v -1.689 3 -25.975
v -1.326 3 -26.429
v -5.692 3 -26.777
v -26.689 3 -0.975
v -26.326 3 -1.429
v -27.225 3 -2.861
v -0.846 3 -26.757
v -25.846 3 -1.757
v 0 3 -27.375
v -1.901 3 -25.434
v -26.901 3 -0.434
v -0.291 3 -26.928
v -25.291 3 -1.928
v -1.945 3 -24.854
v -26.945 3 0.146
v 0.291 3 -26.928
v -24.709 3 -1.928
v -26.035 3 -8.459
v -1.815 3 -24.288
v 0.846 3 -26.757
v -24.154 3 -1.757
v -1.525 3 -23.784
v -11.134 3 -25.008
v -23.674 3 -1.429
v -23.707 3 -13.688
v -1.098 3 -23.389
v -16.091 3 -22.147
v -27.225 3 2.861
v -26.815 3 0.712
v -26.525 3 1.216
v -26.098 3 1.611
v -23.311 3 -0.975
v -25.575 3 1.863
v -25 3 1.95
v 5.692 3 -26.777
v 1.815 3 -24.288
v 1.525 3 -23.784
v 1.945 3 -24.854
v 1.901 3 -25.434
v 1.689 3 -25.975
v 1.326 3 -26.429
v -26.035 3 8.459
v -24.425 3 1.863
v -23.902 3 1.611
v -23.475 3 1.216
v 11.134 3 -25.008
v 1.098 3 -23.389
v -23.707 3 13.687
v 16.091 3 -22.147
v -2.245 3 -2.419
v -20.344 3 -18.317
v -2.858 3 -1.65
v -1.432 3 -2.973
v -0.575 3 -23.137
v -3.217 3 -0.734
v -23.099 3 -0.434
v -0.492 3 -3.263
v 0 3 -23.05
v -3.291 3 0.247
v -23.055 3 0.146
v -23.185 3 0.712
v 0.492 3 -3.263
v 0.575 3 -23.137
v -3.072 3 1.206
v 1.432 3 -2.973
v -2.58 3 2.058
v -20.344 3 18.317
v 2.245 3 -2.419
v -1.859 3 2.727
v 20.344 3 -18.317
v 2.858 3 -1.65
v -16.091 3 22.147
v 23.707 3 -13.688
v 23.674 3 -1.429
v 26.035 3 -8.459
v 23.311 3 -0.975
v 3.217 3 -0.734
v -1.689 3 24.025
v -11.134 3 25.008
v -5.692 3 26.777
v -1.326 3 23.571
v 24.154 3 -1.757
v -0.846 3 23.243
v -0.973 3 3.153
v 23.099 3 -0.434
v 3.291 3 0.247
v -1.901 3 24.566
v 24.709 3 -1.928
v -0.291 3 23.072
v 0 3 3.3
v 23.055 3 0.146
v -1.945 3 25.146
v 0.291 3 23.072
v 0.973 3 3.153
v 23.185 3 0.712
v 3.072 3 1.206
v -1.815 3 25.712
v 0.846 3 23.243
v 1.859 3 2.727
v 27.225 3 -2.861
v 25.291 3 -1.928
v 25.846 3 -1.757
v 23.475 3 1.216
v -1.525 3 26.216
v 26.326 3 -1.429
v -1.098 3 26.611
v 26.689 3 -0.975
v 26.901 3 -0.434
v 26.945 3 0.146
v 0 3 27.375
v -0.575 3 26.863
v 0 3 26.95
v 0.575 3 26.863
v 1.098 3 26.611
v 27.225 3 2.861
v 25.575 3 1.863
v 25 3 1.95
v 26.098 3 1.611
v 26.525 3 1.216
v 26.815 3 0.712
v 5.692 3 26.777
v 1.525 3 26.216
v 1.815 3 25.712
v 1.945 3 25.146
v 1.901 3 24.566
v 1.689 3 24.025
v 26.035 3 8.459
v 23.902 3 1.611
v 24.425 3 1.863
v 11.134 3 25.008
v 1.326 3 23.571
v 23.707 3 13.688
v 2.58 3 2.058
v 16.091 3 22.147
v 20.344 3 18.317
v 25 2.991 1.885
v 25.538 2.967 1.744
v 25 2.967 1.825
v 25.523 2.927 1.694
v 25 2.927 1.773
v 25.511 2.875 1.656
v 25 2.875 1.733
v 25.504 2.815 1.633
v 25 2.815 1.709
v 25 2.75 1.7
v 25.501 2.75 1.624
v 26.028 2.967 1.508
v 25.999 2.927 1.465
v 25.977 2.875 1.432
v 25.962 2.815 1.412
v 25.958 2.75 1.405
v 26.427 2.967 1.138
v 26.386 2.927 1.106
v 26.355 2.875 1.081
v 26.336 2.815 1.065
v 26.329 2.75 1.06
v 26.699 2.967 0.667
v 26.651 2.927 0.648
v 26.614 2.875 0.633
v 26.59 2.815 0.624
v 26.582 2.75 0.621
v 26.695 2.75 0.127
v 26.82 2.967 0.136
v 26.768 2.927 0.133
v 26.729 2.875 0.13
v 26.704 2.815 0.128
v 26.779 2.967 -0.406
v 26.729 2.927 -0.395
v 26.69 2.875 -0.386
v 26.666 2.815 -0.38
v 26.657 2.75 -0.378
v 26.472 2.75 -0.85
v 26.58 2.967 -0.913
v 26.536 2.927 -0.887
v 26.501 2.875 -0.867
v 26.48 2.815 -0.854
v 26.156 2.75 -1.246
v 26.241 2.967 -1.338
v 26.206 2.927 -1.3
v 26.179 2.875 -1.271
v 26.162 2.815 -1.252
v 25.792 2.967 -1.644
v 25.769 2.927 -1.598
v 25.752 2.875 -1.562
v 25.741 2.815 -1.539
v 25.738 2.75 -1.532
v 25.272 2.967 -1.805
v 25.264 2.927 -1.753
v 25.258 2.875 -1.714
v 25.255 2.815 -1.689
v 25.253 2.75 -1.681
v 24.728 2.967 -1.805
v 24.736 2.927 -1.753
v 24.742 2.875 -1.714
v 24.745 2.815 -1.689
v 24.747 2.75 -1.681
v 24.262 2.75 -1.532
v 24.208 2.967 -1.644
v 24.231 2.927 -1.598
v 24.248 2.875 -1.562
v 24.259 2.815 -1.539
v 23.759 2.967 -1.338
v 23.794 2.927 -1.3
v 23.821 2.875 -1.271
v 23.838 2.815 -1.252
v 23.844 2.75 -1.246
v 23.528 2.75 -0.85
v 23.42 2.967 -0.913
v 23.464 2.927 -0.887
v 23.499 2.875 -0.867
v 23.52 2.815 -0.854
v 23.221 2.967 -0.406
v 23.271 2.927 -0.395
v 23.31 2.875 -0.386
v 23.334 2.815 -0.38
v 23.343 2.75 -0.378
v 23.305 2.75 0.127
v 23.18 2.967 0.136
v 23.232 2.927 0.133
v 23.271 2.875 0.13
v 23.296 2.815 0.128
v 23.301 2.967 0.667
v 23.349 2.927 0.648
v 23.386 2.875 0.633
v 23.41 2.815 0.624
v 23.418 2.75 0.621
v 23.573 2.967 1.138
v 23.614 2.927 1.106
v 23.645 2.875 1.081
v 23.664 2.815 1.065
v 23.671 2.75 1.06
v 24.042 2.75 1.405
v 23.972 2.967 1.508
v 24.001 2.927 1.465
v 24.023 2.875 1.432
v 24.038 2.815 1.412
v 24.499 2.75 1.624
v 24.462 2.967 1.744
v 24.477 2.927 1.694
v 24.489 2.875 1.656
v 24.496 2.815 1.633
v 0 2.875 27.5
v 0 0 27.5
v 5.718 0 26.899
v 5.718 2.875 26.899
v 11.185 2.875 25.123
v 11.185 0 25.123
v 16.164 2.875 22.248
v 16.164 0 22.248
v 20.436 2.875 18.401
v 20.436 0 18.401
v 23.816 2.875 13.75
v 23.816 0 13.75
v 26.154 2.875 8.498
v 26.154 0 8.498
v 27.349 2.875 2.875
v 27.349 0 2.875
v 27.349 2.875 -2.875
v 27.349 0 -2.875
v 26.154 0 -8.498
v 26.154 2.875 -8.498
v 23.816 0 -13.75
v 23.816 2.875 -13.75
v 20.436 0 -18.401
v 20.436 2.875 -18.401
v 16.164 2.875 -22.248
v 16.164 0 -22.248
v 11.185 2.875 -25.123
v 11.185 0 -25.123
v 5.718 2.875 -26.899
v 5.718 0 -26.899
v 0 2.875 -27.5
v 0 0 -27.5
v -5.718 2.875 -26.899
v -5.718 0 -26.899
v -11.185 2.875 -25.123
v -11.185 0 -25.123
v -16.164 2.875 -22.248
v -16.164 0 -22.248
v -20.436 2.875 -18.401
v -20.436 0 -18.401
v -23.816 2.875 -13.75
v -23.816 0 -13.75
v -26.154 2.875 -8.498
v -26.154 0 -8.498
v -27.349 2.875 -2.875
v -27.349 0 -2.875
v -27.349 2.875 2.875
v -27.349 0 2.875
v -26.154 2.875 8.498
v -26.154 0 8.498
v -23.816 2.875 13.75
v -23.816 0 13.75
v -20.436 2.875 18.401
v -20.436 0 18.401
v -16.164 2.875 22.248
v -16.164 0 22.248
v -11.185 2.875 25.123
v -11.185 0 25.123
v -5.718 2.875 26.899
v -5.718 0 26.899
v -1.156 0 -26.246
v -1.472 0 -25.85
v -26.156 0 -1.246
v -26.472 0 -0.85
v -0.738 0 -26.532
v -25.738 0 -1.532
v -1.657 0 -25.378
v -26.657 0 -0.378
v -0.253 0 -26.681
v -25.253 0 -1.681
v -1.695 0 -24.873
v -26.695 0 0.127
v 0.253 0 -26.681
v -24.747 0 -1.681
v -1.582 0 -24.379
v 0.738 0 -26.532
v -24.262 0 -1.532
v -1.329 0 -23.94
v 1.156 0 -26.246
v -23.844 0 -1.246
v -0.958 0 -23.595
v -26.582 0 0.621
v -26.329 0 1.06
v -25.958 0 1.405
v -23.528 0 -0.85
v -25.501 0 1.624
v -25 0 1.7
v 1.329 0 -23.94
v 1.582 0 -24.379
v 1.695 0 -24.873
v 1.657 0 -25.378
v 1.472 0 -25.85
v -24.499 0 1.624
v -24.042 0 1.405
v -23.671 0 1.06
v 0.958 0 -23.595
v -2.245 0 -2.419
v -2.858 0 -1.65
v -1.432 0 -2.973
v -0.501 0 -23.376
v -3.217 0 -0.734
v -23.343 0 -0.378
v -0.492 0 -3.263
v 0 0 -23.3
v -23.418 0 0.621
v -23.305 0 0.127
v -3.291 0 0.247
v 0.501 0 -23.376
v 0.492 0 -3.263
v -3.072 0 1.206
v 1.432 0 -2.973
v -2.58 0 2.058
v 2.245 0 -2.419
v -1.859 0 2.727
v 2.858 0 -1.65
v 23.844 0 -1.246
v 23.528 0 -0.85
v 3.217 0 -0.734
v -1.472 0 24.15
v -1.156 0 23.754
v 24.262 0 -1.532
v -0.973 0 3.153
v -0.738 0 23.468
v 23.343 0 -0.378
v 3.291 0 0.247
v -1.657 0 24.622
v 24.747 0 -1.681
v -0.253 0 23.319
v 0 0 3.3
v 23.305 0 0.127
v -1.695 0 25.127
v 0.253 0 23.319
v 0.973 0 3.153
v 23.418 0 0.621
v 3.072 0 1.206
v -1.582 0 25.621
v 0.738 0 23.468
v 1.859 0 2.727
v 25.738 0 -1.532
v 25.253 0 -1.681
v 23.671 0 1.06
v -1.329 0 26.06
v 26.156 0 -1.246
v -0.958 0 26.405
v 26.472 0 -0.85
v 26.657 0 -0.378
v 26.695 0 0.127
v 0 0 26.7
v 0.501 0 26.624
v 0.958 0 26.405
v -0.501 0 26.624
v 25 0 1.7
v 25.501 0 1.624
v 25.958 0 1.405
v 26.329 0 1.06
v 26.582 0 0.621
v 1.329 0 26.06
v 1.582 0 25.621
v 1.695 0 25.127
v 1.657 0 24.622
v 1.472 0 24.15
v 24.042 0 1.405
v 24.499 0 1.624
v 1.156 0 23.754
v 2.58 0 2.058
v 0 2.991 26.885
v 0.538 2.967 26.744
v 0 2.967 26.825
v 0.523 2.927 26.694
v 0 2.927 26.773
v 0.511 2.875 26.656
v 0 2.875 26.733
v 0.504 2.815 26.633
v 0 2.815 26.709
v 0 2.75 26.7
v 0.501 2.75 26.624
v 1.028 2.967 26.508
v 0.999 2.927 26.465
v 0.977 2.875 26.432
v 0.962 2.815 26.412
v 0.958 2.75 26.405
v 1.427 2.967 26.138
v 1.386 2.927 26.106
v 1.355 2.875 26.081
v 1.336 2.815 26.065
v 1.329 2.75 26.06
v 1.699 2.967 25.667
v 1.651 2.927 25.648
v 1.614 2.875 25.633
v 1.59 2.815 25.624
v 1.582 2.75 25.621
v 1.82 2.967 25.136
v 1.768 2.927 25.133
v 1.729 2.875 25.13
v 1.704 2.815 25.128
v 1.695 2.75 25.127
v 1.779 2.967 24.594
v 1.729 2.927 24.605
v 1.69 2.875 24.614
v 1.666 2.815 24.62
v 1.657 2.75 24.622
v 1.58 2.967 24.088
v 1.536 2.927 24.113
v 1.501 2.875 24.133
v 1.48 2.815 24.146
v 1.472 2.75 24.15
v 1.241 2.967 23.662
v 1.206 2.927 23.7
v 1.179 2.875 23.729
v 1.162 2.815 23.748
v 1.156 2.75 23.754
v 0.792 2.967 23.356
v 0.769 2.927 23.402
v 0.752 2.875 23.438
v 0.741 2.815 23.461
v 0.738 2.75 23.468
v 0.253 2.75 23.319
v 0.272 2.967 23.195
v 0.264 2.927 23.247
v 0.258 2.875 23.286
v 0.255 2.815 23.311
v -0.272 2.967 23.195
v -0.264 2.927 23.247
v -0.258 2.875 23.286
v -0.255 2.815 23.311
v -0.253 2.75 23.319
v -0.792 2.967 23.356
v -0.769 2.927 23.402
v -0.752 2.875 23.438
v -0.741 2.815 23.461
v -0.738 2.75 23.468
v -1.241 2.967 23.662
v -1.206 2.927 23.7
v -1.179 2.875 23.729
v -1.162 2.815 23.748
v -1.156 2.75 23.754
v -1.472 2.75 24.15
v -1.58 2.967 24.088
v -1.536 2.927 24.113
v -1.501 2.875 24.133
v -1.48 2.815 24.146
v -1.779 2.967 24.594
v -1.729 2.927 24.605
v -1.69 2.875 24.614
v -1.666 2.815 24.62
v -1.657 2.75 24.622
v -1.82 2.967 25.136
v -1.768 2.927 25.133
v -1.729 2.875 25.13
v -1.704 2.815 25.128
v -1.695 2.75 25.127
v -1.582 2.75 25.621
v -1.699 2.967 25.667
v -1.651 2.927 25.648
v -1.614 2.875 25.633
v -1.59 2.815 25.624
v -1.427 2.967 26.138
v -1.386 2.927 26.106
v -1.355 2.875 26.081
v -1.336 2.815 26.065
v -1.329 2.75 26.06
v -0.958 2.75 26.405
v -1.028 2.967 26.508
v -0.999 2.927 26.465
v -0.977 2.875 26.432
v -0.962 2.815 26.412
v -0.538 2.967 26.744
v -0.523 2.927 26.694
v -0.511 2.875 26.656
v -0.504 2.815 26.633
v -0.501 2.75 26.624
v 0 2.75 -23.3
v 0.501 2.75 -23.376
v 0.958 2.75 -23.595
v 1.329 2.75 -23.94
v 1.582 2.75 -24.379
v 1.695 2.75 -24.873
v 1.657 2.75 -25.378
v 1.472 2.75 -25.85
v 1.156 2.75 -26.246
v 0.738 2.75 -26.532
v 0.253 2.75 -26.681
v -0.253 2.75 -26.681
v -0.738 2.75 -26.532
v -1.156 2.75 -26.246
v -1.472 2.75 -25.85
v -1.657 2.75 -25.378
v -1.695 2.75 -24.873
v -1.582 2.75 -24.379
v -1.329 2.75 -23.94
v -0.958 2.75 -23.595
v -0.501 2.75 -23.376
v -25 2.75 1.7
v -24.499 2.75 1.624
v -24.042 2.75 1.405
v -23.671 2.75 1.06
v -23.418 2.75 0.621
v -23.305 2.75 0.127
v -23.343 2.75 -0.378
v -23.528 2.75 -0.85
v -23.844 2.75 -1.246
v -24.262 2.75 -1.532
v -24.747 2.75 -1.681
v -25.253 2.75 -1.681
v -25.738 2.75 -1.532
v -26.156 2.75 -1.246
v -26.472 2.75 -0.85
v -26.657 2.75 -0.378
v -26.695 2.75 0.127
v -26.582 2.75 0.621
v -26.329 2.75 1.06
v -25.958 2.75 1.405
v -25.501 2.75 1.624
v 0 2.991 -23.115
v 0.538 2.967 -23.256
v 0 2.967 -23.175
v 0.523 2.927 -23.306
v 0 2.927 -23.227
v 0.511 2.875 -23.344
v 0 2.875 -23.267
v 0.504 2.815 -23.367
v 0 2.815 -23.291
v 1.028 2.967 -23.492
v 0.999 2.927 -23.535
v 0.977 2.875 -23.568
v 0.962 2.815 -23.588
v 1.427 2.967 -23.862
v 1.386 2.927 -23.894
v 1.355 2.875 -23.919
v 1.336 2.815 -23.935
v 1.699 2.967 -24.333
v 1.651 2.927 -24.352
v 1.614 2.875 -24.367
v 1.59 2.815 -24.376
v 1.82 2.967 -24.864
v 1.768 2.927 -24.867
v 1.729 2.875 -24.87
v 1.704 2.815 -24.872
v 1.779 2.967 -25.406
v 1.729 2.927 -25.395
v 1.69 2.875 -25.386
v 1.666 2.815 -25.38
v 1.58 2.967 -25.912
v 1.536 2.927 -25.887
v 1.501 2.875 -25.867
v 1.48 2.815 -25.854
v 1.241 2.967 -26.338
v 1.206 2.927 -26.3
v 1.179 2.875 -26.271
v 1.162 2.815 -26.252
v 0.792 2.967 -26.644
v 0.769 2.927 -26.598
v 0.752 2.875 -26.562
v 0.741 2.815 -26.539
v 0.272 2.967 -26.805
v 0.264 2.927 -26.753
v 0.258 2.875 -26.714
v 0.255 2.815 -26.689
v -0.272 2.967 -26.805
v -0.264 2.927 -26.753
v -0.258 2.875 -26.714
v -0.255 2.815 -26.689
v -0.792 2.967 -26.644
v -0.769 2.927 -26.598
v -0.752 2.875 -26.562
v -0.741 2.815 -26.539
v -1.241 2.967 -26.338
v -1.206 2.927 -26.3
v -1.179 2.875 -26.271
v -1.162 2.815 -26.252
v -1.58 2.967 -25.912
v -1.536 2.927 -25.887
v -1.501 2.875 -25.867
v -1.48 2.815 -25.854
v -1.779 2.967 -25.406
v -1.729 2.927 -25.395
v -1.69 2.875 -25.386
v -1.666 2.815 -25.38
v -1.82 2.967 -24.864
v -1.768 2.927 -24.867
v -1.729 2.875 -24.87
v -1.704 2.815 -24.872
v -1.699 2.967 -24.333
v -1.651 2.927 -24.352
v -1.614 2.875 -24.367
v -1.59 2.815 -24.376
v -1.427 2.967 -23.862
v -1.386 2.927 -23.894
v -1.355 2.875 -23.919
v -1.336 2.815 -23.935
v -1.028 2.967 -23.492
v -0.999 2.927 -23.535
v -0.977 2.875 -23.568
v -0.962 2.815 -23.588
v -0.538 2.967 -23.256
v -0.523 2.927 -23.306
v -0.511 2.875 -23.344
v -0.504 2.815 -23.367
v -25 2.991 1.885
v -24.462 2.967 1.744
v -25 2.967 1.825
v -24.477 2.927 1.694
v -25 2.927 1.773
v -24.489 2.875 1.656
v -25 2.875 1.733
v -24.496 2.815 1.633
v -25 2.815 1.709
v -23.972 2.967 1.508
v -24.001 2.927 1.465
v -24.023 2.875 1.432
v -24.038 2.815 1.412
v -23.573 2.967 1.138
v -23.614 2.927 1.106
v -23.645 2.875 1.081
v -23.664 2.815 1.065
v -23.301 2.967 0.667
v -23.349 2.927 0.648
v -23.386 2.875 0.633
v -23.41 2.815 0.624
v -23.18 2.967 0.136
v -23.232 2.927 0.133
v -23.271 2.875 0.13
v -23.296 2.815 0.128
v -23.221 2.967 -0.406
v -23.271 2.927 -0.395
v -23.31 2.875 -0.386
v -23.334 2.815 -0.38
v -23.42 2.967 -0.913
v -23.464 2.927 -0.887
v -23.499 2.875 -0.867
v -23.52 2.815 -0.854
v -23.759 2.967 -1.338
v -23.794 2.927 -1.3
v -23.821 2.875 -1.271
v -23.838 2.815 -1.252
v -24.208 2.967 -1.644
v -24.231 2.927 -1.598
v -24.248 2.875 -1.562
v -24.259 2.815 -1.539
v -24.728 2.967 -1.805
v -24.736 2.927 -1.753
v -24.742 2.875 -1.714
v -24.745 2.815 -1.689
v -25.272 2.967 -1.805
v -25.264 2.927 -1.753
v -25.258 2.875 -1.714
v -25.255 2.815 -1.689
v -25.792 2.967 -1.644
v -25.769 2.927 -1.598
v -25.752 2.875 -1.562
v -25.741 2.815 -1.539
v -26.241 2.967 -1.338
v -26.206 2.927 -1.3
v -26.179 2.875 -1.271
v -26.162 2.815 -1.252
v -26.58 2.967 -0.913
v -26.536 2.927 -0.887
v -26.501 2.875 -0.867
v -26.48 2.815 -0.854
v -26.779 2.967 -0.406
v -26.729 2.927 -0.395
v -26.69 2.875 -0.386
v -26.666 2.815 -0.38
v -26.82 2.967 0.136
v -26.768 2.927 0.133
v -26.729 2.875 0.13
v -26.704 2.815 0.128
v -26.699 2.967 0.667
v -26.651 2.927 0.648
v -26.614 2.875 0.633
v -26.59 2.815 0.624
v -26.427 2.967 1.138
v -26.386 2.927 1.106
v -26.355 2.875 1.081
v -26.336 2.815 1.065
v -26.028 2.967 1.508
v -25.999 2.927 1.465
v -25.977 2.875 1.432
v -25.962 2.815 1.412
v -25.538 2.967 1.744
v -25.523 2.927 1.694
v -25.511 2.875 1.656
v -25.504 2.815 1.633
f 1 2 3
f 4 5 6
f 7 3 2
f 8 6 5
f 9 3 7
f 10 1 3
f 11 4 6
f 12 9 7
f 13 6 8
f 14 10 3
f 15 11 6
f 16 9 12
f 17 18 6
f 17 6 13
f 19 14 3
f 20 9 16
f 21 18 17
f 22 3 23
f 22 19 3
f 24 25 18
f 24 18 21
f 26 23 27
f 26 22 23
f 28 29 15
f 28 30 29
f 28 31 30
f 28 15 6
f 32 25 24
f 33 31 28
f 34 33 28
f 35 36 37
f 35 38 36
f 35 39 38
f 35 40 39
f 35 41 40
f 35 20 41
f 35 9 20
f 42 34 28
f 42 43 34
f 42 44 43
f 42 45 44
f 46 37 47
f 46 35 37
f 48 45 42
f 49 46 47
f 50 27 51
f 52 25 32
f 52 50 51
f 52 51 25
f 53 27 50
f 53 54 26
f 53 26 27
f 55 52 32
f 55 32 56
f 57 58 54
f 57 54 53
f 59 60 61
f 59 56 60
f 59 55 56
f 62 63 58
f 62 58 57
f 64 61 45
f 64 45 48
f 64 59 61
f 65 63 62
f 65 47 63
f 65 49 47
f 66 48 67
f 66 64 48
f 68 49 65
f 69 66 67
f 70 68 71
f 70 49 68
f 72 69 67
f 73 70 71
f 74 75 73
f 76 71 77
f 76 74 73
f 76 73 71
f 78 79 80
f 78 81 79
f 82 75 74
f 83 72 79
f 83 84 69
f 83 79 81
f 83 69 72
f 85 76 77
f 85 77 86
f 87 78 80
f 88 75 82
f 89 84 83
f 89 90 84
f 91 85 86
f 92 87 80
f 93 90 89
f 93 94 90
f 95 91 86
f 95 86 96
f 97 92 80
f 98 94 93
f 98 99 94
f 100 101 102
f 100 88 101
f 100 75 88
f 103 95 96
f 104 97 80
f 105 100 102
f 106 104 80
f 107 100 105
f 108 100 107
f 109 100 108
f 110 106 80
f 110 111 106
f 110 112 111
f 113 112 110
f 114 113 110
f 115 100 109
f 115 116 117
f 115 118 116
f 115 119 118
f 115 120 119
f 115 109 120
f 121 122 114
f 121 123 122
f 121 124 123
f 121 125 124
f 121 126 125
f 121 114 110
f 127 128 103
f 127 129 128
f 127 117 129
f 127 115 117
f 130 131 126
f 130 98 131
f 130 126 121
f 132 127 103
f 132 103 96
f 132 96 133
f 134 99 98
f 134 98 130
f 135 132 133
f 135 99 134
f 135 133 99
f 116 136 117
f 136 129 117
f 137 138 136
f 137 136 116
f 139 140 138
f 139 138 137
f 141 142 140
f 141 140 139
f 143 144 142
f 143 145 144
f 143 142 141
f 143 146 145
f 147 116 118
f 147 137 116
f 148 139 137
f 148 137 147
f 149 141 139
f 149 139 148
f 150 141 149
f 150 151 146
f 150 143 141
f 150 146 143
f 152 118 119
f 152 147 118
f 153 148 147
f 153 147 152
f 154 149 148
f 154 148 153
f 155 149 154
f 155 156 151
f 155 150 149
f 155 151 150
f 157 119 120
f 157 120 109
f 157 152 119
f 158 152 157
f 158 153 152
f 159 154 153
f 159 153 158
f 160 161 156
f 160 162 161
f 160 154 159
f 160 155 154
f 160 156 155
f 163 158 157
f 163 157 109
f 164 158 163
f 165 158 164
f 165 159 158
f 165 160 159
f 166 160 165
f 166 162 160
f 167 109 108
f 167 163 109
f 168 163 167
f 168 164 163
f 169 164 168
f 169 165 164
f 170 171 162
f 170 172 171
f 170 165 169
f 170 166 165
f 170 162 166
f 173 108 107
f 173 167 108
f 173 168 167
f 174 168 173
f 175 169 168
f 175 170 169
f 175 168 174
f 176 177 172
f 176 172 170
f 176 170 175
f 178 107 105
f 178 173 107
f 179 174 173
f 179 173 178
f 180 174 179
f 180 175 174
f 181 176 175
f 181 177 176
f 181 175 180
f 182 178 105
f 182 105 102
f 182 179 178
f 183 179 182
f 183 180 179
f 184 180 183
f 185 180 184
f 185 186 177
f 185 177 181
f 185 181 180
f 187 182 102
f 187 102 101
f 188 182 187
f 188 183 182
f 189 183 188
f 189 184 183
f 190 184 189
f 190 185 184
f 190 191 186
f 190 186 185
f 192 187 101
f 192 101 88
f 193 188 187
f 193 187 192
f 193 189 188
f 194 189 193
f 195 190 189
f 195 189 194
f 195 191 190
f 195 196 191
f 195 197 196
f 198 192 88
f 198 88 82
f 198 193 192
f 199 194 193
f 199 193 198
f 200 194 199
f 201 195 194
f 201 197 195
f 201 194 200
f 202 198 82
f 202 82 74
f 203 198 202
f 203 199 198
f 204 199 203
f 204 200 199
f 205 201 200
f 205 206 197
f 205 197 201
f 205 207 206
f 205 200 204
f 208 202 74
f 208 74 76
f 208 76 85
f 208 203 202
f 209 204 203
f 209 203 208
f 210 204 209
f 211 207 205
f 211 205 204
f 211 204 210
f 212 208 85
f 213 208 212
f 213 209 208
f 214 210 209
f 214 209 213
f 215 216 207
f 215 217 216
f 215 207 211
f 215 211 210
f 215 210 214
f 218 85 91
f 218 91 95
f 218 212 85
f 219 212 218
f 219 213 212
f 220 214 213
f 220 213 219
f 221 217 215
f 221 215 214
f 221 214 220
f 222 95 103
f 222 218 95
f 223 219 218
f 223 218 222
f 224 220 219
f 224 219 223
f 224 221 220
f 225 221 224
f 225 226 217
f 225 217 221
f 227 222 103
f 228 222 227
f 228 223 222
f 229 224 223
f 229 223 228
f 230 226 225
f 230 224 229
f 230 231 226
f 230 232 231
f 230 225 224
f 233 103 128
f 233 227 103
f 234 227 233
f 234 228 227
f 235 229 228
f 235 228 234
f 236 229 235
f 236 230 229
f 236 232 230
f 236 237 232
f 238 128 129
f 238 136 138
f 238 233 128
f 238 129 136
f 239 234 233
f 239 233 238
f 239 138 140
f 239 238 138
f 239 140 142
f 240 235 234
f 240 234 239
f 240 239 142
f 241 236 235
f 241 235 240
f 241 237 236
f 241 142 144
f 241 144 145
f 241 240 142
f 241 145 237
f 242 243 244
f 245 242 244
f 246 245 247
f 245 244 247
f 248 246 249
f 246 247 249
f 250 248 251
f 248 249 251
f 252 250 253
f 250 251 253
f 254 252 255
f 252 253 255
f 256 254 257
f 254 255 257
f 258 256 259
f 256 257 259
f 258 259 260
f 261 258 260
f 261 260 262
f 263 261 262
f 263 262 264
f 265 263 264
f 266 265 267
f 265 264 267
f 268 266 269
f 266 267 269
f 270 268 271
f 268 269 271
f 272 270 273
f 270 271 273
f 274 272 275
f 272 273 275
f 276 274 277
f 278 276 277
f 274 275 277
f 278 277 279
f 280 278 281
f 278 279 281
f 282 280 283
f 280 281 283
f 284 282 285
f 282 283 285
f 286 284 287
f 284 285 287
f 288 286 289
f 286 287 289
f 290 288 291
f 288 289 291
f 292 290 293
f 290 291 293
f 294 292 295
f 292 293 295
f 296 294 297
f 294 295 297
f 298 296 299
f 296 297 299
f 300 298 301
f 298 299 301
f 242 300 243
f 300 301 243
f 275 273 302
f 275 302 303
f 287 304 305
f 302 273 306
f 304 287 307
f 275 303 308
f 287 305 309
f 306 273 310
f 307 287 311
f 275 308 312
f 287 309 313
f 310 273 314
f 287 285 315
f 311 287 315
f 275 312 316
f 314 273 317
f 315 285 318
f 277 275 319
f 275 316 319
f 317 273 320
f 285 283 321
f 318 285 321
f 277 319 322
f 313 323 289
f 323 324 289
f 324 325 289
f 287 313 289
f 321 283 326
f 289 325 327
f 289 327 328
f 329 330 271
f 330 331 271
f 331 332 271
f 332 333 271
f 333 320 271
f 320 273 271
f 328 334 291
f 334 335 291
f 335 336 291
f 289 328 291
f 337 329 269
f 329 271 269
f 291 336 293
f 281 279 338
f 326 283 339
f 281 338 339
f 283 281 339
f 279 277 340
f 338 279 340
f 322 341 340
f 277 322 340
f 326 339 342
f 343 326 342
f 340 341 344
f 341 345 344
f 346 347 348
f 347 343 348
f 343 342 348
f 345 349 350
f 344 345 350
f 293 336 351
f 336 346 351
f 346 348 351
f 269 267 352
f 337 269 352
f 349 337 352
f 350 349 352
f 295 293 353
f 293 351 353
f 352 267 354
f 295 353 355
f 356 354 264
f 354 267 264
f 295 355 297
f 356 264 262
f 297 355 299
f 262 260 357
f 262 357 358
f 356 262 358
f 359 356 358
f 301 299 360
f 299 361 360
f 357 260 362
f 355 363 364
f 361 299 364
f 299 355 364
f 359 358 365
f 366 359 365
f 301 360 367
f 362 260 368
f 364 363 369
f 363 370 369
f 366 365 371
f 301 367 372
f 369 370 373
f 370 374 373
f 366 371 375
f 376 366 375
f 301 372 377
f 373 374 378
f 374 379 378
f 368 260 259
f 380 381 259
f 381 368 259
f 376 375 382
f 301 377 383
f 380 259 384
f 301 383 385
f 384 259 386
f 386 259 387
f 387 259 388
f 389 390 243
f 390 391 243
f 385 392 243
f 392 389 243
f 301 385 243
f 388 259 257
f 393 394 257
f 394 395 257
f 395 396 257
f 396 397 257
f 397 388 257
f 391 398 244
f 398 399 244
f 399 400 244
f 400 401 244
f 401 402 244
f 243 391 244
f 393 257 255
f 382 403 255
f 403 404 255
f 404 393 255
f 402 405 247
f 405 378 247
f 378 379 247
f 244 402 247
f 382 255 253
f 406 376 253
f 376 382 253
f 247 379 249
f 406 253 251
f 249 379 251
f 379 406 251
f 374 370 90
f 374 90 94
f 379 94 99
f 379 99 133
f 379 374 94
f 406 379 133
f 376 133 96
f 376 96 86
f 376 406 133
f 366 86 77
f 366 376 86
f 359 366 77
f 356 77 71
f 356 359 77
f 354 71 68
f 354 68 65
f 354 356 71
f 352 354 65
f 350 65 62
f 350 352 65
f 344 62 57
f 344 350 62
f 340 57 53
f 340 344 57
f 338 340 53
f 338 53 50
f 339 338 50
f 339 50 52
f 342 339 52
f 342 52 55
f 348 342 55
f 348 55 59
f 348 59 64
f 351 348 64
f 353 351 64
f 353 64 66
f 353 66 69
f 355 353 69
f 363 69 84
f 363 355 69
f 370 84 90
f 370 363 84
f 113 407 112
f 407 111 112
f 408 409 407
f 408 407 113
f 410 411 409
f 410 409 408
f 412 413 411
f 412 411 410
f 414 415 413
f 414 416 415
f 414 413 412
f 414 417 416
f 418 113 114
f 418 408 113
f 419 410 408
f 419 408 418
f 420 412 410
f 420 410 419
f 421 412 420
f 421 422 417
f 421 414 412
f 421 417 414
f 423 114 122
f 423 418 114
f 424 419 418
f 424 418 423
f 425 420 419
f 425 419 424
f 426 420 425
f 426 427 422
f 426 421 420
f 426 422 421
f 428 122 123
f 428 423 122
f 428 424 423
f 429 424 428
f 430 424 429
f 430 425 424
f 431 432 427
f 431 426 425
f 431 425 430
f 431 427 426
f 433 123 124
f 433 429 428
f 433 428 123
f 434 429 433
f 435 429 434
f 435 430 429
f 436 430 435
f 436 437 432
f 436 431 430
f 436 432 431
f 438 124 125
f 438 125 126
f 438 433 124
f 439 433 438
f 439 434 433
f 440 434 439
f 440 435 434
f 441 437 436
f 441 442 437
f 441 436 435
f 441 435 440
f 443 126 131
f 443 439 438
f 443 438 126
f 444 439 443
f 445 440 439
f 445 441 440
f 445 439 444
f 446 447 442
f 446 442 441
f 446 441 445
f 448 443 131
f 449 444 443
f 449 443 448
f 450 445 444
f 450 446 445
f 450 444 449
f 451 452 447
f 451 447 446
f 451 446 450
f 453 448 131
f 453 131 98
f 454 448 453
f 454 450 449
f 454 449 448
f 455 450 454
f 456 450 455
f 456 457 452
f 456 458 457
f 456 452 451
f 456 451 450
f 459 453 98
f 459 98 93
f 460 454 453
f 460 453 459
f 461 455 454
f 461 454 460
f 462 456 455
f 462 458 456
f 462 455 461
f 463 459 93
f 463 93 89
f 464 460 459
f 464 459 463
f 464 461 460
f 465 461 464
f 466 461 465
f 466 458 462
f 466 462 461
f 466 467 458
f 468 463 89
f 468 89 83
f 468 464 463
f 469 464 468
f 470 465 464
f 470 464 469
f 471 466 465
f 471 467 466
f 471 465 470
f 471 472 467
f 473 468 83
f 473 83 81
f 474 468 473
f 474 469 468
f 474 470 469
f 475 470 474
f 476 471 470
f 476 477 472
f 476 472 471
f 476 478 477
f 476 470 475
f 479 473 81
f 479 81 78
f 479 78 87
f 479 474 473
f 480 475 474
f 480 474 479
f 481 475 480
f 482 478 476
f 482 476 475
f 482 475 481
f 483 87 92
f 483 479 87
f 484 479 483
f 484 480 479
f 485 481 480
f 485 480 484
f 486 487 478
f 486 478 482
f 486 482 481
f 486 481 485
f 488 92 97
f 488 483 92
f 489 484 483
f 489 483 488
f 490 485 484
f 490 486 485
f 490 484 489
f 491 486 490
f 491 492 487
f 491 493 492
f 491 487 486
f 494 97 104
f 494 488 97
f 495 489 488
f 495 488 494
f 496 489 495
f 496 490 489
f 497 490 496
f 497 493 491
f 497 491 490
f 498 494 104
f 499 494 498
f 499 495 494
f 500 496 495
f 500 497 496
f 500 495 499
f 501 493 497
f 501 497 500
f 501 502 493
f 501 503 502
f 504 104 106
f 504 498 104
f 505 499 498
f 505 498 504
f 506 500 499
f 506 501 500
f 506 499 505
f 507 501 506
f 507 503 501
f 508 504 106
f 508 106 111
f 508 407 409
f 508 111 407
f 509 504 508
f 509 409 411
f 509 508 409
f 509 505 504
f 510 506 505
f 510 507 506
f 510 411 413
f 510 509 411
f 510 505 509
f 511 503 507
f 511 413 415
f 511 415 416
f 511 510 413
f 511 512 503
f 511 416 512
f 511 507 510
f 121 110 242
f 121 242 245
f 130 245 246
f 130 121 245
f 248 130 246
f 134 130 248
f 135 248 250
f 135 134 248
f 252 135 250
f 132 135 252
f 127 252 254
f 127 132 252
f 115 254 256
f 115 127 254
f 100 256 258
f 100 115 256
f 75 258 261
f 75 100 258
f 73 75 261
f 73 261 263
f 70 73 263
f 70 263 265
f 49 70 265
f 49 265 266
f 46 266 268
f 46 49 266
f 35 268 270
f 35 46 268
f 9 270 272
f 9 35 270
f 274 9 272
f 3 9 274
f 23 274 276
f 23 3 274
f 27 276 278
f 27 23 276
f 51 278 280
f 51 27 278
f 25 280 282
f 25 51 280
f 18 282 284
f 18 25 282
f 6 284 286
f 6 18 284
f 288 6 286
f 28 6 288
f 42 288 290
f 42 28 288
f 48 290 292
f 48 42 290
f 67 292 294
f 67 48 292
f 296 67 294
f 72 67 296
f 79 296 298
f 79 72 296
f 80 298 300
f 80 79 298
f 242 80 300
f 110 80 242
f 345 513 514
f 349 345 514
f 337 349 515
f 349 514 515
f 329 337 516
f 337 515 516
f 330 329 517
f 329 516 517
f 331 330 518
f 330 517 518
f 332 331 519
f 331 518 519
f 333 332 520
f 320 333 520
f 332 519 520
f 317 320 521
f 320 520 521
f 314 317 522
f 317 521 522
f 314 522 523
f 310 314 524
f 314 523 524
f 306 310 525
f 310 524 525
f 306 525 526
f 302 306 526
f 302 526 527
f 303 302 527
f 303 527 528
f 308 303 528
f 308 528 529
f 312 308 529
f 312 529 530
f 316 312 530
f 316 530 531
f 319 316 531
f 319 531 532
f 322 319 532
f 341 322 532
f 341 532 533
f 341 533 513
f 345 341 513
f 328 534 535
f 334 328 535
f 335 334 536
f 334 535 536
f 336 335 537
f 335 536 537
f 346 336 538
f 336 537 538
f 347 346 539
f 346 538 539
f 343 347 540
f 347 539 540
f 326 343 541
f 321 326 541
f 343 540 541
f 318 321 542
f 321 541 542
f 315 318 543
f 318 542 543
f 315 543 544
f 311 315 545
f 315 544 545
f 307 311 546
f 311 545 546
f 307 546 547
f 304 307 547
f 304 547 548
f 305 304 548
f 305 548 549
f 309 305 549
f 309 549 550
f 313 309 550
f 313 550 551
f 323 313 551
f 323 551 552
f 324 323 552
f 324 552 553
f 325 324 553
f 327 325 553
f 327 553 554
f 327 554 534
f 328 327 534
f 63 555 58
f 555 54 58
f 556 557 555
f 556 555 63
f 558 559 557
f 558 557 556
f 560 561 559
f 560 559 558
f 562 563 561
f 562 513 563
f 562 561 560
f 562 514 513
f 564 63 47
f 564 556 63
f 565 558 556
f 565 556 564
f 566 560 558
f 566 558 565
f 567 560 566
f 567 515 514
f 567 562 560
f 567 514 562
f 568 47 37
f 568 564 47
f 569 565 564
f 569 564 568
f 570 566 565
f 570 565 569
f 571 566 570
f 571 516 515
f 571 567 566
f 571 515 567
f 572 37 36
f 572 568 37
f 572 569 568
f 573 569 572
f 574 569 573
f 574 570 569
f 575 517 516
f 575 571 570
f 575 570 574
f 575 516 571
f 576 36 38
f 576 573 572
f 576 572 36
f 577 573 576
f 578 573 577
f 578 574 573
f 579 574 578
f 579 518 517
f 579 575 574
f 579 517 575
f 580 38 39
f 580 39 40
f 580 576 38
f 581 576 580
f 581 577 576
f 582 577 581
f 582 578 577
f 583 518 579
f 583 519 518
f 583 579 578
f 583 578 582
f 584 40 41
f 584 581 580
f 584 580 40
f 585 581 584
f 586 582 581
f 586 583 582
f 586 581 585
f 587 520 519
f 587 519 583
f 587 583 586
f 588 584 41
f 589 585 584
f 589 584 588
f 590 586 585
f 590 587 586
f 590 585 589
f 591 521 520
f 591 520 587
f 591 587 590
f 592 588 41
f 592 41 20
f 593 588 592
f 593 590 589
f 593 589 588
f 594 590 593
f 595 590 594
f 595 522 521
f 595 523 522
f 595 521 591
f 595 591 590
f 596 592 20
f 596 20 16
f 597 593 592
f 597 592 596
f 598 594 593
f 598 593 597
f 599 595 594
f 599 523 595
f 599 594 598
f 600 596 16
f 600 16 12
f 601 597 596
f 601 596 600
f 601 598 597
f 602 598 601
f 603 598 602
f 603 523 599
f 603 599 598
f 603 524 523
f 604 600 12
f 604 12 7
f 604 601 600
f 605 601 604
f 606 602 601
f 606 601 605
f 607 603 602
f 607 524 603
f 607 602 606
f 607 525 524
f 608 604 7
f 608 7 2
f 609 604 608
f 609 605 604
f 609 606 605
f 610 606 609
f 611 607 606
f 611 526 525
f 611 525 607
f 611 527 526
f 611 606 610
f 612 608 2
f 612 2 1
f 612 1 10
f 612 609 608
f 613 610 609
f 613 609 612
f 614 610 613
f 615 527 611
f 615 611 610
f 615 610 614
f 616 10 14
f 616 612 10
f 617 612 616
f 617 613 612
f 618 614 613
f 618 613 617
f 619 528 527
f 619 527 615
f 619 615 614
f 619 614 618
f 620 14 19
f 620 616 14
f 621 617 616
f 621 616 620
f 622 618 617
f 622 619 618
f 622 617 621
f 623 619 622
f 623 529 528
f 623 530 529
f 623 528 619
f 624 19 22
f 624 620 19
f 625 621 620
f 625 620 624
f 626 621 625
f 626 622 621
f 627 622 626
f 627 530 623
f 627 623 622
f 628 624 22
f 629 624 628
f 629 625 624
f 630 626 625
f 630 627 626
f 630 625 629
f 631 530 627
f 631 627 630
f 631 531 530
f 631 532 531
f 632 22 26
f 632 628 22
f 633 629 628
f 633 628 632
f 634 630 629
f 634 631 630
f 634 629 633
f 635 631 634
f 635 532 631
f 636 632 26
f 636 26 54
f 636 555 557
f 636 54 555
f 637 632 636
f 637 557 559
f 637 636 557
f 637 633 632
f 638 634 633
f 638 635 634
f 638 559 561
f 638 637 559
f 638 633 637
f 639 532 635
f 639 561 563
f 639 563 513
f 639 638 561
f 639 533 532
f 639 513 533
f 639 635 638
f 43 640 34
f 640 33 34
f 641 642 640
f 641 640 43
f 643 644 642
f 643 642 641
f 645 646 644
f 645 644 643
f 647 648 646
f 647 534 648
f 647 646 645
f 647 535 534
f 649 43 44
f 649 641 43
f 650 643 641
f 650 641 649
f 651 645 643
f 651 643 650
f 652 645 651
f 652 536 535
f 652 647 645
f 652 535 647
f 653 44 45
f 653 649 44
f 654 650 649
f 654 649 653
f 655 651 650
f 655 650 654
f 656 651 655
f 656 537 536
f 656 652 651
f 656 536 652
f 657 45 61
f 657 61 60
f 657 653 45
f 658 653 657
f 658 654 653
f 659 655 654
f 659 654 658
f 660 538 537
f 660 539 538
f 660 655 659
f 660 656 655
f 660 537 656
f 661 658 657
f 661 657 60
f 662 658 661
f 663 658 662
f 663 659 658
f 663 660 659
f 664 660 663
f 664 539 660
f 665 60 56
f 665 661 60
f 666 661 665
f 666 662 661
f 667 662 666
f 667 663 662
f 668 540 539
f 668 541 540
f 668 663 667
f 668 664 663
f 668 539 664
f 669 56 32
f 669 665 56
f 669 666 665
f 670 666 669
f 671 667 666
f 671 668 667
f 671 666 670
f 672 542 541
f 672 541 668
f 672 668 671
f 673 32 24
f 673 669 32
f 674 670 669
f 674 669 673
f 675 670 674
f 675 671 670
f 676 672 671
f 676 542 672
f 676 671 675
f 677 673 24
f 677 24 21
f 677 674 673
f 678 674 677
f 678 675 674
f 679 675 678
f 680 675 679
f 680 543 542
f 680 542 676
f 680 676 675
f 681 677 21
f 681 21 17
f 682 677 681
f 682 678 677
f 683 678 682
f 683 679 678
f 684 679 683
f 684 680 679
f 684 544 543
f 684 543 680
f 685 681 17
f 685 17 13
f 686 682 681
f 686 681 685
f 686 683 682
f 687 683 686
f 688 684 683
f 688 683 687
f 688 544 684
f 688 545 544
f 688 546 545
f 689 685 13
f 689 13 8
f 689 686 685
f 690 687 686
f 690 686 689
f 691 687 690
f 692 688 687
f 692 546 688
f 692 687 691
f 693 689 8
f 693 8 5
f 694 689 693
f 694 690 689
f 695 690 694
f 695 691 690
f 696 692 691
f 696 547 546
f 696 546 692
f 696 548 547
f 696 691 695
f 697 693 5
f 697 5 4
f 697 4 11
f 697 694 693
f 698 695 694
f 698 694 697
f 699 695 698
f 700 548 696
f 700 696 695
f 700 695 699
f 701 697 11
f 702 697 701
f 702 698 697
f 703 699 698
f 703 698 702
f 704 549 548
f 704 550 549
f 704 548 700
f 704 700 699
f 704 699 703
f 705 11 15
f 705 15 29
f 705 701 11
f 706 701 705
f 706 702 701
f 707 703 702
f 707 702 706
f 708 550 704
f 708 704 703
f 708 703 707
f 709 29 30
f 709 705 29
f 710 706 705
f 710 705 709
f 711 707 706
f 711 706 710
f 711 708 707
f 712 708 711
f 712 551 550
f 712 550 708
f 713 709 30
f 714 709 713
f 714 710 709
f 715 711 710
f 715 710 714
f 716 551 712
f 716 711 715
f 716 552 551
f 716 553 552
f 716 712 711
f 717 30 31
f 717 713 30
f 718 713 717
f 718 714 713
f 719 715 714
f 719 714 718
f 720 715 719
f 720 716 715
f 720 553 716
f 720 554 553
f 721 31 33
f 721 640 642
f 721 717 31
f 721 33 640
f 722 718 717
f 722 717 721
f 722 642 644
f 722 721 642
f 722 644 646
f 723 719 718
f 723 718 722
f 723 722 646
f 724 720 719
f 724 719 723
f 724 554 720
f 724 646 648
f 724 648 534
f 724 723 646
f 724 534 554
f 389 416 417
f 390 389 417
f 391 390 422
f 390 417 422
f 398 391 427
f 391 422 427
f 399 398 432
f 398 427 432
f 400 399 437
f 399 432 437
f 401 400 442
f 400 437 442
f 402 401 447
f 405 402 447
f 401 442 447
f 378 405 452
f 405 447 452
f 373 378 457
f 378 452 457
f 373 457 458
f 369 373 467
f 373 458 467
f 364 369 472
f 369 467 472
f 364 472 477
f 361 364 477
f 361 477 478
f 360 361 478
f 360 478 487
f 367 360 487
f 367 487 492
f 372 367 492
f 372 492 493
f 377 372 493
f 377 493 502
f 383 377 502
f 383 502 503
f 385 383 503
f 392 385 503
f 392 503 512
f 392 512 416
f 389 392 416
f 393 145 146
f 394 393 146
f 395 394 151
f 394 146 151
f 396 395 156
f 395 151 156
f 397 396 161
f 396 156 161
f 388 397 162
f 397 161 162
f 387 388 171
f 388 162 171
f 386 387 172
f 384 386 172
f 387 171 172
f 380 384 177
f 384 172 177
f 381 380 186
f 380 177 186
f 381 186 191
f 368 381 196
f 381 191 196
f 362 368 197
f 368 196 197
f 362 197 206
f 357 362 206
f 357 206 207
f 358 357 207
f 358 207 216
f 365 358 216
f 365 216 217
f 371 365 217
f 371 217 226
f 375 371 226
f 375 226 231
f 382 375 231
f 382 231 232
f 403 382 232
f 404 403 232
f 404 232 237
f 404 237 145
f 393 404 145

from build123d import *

# Parameters (mm, degrees)
SKETCH1_R           = 27.5
SKETCH1_R_2         = 3.3
BOSS_EXTRUDE1_DEPTH = 3
SKETCH2_R           = 1.7
CUT_EXTRUDE1_DEPTH  = 40.00640973
CHAMFER1_SIZE       = 0.125
FILLET1_R           = 0.25


with BuildPart() as part:
    # Sketch1 → Boss-Extrude1 (new body)
    with BuildSketch(Plane(origin=(0, 0, 0), x_dir=(1, 0, 0), z_dir=(0, 1, 0))):
        with Locations(Location((0, 0, 0), (0, 0, 270))):
            Circle(SKETCH1_R)
        with Locations(Location((0, 0, 0), (0, 0, 270))):
            Circle(SKETCH1_R_2, mode=Mode.SUBTRACT)
    extrude(amount=BOSS_EXTRUDE1_DEPTH)

    # Sketch2 → Cut-Extrude1 (cut, through all)
    with BuildSketch(Plane(origin=(0, 3, 0), x_dir=(1, 0, 0), z_dir=(0, 1, 0))):
        with Locations(Location((-25, 0, 0), (0, 0, 270))):
            Circle(SKETCH2_R)
        with Locations(Location((0, -25, 0), (0, 0, 270))):
            Circle(SKETCH2_R)
        with Locations(Location((25, 0, 0), (0, 0, 270))):
            Circle(SKETCH2_R)
        with Locations(Location((0, 25, 0), (0, 0, 270))):
            Circle(SKETCH2_R)
    extrude(amount=-CUT_EXTRUDE1_DEPTH, mode=Mode.SUBTRACT)

    # Chamfer1
    chamfer1_edges = [part.edges().sort_by_distance(p)[0] for p in [
        (0, 3, -27.5),
    ]]
    chamfer(chamfer1_edges, length=CHAMFER1_SIZE)

    # Fillet1
    fillet1_edges = [part.edges().sort_by_distance(p)[0] for p in [
        (-25, 3, -1.7),
        (0, 3, 23.3),
        (25, 3, -1.7),
        (0, 3, -26.7),
    ]]
    fillet(fillet1_edges, radius=FILLET1_R)


solid = part.part
